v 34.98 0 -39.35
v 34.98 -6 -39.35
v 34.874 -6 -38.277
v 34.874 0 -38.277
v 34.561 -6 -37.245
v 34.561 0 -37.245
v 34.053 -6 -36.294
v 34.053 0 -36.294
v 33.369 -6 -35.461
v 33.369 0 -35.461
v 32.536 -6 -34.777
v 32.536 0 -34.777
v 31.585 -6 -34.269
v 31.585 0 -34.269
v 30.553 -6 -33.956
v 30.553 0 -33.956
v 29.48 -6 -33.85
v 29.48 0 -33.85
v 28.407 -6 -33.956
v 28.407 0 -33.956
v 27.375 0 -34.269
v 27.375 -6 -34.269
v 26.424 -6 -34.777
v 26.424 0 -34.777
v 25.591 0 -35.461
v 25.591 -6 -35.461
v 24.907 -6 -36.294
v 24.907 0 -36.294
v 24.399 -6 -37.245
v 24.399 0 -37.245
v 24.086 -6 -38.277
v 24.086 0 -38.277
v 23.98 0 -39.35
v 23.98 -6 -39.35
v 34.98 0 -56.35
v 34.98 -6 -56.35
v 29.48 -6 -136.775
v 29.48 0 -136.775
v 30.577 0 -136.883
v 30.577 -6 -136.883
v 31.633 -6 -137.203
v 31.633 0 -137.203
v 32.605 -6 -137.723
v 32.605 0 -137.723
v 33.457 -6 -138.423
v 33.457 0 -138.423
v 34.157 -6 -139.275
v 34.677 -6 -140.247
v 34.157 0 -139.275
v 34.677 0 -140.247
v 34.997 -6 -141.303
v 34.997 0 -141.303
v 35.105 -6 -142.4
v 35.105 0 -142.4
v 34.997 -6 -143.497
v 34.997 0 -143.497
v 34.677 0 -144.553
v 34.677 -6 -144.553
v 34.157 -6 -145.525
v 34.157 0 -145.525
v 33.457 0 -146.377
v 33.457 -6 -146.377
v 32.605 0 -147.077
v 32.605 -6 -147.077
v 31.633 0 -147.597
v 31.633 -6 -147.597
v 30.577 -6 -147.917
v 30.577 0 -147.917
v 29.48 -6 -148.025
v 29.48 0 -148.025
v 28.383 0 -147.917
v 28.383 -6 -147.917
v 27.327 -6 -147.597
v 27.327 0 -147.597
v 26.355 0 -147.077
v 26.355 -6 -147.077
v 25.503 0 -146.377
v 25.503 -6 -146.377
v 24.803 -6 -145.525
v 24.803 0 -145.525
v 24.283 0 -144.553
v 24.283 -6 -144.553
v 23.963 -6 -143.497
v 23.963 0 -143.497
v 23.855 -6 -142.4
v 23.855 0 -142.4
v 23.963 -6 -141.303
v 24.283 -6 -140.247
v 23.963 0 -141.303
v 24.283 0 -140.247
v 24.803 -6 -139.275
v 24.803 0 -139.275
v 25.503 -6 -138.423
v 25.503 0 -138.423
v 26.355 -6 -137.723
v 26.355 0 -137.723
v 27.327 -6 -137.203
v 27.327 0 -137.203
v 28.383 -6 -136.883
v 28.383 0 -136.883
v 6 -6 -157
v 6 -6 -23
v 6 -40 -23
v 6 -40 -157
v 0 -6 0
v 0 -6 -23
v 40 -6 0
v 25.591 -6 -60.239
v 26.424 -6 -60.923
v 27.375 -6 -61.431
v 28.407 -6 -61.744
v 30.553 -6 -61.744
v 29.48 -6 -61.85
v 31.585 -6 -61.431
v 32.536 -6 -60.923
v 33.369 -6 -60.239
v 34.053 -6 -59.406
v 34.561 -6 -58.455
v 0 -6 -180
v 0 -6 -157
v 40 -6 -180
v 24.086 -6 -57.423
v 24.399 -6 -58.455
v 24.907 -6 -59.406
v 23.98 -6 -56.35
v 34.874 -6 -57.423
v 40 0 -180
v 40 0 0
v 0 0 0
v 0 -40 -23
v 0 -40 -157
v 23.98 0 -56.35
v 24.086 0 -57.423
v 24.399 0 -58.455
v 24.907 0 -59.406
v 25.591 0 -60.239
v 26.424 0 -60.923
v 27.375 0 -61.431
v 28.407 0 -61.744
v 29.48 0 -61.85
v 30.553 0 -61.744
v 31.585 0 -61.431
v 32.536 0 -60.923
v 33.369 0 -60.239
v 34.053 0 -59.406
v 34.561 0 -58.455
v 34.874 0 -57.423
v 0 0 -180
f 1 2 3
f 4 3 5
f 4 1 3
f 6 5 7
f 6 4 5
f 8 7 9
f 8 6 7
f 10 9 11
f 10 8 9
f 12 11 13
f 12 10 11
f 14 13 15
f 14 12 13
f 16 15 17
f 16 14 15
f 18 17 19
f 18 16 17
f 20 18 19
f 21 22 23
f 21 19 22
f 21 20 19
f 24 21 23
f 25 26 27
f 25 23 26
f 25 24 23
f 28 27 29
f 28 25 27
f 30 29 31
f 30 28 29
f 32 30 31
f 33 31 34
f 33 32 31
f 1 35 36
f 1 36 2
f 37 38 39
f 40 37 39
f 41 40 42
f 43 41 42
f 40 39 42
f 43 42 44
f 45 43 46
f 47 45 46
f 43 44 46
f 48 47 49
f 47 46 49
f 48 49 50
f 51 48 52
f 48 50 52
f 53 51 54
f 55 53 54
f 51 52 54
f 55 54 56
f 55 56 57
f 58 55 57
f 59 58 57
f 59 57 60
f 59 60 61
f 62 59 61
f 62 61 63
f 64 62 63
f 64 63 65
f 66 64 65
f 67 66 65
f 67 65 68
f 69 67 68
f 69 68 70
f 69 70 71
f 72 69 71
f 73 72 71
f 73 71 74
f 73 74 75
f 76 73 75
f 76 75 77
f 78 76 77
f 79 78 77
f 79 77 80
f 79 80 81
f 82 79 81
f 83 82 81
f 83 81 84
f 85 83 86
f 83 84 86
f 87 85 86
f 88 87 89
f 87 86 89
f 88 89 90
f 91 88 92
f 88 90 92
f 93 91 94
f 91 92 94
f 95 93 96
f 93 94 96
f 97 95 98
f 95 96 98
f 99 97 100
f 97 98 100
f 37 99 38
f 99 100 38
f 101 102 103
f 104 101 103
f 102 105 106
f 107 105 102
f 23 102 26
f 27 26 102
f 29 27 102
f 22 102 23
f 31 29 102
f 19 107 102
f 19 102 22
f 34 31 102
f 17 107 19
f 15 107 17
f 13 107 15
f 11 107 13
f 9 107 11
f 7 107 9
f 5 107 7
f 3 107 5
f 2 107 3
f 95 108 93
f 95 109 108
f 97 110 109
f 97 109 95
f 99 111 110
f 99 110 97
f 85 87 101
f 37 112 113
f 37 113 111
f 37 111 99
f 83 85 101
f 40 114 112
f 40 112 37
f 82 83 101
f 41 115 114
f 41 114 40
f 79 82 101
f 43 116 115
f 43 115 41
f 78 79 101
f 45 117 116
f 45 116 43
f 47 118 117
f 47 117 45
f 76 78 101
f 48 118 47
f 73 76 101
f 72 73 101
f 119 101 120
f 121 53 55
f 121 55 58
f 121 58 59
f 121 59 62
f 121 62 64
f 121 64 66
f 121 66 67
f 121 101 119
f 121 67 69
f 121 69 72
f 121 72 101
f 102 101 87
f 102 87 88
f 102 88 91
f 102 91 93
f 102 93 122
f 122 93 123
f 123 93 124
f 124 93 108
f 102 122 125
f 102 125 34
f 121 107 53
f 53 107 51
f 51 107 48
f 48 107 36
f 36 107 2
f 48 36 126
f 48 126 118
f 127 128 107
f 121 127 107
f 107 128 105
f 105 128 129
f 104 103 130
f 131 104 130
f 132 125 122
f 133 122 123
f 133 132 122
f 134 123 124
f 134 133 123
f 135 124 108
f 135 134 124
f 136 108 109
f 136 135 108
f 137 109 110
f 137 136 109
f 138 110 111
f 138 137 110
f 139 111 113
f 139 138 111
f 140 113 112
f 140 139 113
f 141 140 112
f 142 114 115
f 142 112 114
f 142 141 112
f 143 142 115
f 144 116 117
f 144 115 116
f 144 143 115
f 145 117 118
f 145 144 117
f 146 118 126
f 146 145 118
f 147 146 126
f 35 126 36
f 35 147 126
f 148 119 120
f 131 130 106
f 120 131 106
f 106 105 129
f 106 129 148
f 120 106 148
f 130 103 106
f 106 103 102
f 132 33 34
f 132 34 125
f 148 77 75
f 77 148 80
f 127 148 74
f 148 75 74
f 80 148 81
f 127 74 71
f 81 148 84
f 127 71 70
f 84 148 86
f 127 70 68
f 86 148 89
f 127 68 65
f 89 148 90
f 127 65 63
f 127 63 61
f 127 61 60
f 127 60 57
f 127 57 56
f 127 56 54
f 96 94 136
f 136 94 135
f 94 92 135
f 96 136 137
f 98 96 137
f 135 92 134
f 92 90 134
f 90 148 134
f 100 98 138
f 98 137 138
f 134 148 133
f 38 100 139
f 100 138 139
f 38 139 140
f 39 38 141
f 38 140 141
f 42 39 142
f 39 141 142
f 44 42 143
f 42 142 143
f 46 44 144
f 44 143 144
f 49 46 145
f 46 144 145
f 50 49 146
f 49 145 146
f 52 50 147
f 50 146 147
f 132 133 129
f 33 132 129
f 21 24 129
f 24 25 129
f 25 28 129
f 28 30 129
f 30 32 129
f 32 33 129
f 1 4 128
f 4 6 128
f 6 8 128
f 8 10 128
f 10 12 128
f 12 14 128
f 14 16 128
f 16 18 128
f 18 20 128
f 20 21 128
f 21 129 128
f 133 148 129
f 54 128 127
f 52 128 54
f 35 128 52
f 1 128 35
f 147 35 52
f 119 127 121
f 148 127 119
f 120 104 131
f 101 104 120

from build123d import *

# Parameters (mm, degrees)
BOSS_EXTRUDE2_DEPTH = 180
SKETCH3_W           = 23
SKETCH3_H           = 34
CUT_EXTRUDE2_DEPTH  = 10
SKETCH4_R           = 5.625
CUT_EXTRUDE3_DEPTH  = 10


with BuildPart() as part:
    # Sketch1 → Boss-Extrude2 (new body)
    with BuildSketch(Plane.XY):
        Polygon((0, 0), (40, 0), (40, -6), (6, -6), (6, -40), (0, -40), align=None)
    extrude(amount=-BOSS_EXTRUDE2_DEPTH)

    # Sketch3 → Cut-Extrude2 (cut)
    with BuildSketch(Plane(origin=(6, 0, 0), x_dir=(0, 0, -1), z_dir=(1, 0, 0))):
        with Locations((11.5, -23)):
            Rectangle(SKETCH3_W, SKETCH3_H)
        with Locations((168.5, -23)):
            Rectangle(SKETCH3_W, SKETCH3_H)
    extrude(amount=-CUT_EXTRUDE2_DEPTH, mode=Mode.SUBTRACT)

    # Sketch4 → Cut-Extrude3 (cut)
    with BuildSketch(Plane(origin=(0, 0, 0), x_dir=(1, 0, 0), z_dir=(0, 1, 0))):
        with Locations(Location((29.48, 142.4, 0), (0, 0, 270))):
            Circle(SKETCH4_R)
        with BuildLine():
            Line((34.98, 56.35), (34.98, 39.35))
            ThreePointArc((34.98, 39.35), (29.48, 33.85), (23.98, 39.35))
            Line((23.98, 39.35), (23.98, 56.35))
            ThreePointArc((23.98, 56.35), (29.48, 61.85), (34.98, 56.35))
        make_face()
    extrude(amount=-CUT_EXTRUDE3_DEPTH, mode=Mode.SUBTRACT)


solid = part.part
